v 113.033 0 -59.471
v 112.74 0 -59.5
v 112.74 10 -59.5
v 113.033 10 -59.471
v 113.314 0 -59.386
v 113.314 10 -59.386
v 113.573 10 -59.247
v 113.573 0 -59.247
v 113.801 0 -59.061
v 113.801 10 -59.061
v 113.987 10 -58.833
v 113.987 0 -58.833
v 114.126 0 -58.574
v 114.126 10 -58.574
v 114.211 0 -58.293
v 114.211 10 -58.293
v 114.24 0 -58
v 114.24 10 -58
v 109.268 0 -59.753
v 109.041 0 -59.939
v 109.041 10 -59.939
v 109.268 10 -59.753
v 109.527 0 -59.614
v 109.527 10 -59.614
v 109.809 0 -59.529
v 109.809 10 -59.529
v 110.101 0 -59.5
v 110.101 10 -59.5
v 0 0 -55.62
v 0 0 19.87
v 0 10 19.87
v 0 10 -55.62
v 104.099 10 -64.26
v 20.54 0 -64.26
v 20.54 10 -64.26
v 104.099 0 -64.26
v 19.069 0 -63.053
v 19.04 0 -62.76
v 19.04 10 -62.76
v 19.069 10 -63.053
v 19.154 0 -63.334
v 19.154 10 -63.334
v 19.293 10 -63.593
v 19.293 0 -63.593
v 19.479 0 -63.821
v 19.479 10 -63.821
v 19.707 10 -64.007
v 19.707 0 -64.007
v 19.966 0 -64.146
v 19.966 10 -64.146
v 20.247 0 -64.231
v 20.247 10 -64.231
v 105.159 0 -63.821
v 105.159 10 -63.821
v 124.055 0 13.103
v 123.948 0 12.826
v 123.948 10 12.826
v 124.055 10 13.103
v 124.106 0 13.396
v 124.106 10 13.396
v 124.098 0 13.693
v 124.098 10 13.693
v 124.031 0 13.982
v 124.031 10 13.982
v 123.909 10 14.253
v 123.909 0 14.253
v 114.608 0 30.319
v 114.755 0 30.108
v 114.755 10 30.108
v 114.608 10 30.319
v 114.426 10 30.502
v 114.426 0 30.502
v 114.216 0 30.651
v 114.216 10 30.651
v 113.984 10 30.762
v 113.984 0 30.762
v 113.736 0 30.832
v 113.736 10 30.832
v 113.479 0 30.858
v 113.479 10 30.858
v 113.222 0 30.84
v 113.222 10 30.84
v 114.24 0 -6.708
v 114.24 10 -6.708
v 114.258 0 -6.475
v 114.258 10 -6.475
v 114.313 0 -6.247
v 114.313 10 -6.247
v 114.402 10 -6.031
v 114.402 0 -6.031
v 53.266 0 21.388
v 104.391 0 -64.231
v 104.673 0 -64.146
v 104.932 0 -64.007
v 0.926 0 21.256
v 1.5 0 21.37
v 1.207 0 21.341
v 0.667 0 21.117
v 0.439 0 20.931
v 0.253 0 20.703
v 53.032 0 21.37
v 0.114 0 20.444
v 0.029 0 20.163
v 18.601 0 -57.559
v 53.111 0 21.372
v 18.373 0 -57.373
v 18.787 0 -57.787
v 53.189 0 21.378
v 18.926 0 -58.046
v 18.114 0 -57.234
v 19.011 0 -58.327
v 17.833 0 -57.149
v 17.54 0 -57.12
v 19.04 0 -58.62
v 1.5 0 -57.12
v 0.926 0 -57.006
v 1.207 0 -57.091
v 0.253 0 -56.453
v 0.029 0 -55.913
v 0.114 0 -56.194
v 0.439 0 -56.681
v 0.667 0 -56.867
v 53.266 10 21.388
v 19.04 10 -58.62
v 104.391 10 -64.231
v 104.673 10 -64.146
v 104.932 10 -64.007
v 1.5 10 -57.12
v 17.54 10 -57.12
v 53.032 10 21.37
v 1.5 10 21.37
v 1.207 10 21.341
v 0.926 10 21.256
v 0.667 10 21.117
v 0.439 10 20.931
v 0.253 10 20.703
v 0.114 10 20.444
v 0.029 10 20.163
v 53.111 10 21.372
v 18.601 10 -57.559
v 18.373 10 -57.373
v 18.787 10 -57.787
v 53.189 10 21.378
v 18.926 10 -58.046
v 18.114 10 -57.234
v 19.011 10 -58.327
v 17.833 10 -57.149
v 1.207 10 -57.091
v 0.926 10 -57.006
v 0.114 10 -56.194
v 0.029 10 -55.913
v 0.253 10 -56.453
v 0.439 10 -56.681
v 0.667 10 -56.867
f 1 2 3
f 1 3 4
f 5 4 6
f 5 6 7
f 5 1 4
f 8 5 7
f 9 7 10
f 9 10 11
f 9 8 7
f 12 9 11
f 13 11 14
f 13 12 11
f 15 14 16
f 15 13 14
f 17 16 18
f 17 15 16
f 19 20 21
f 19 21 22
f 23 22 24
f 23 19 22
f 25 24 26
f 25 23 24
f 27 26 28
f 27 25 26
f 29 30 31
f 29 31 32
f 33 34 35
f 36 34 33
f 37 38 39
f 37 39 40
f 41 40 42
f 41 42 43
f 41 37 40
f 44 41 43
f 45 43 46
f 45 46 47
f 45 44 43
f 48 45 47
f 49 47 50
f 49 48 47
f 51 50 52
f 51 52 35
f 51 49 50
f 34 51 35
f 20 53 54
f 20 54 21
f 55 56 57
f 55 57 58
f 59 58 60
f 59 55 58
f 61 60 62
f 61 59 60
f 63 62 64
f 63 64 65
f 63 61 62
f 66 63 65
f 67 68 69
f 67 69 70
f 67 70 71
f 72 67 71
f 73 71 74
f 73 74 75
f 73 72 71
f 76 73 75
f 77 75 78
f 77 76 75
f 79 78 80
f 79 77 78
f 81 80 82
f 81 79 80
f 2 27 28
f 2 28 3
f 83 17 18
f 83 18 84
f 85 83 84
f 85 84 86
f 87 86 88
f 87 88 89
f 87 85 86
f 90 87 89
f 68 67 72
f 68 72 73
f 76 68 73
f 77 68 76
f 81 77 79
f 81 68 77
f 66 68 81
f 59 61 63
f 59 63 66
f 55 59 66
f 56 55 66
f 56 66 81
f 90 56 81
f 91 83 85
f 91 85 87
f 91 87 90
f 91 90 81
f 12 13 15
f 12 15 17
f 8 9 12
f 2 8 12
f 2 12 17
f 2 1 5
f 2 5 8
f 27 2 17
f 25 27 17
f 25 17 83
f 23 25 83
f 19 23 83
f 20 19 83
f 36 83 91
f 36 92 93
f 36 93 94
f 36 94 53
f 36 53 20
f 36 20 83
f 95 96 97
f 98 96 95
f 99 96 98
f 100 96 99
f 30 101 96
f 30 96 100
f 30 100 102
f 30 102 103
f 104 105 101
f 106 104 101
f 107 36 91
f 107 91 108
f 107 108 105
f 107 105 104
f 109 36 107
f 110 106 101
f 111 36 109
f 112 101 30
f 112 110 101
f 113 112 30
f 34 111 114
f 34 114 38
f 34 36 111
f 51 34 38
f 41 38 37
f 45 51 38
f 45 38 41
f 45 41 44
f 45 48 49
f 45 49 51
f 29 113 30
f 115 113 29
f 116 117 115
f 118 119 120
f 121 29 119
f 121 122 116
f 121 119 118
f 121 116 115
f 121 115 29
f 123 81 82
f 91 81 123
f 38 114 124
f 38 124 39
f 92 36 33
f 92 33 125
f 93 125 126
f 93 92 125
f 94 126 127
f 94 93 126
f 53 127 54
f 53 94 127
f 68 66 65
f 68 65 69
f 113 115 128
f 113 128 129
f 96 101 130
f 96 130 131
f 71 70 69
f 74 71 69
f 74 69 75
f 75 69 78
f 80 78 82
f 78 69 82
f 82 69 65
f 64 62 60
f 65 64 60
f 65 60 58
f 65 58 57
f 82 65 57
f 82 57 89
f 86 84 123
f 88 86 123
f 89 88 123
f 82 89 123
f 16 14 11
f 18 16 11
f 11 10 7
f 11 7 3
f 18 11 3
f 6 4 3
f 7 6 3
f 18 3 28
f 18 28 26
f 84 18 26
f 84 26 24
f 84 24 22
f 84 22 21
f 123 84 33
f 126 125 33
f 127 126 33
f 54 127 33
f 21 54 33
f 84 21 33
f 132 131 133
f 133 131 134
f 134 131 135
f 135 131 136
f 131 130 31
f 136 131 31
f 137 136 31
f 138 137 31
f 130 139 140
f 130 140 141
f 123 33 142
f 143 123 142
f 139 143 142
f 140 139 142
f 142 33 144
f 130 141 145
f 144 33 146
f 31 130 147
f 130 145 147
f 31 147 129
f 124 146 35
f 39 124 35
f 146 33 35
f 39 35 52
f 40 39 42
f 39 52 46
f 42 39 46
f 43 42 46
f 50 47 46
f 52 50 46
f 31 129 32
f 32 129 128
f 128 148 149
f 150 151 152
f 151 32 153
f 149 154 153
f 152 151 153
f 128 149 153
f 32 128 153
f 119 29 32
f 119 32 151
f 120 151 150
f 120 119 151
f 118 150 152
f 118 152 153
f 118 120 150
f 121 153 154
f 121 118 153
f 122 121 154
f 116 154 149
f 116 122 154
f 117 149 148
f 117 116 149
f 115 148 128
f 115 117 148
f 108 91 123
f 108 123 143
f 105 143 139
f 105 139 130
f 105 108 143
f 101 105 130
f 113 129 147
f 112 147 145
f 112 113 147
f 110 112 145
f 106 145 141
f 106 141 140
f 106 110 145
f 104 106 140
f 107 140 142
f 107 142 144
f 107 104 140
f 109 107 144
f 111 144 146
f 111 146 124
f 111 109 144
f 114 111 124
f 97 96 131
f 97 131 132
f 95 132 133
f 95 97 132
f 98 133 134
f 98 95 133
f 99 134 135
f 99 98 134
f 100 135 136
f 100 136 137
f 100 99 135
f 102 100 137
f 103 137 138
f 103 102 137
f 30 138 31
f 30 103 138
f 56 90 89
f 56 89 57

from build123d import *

# Parameters (mm, degrees)
AUFSATZ_LINEAR_AUSTRAGEN1_DEPTH = 10


with BuildPart() as part:
    # Skizze2 → Aufsatz-Linear austragen1 (new body)
    with BuildSketch(Plane(origin=(0, 0, 0), x_dir=(1, 0, 0), z_dir=(0, 1, 0))):
        with BuildLine():
            Line((0, 0), (0, 55.62))
            ThreePointArc((0, 55.62), (0.439339828, 56.680660172), (1.5, 57.12))
            Line((1.5, 57.12), (17.54, 57.12))
            ThreePointArc((17.54, 57.12), (18.600660172, 57.559339828), (19.04, 58.62))
            Line((19.04, 58.62), (19.04, 62.76))
            ThreePointArc((19.04, 62.76), (19.479339828, 63.820660172), (20.54, 64.26))
            Line((20.54, 64.26), (104.098679656, 64.26))
            ThreePointArc((104.098679656, 64.26), (104.672704805, 64.145819299), (105.159339828, 63.820660172))
            Line((105.159339828, 63.820660172), (109.040660172, 59.939339828))
            ThreePointArc((109.040660172, 59.939339828), (109.527295195, 59.614180701), (110.101320344, 59.5))
            Line((110.101320344, 59.5), (112.74, 59.5))
            ThreePointArc((112.74, 59.5), (113.800660172, 59.060660172), (114.24, 58))
            Line((114.24, 58), (114.24, 6.708065653))
            ThreePointArc((114.24, 6.708065653), (114.280993169, 6.359785497), (114.401732089, 6.030541484))
            Line((114.401732089, 6.030541484), (123.948031101, -12.825620738))
            ThreePointArc((123.948031101, -12.825620738), (124.109197107, -13.544350864), (123.908801296, -14.253144906))
            Line((123.908801296, -14.253144906), (114.755057795, -30.10789373))
            ThreePointArc((114.755057795, -30.10789373), (114.102280417, -30.71153588), (113.222449486, -30.839597128))
            Line((113.222449486, -30.839597128), (53.266068474, -21.388296602))
            ThreePointArc((53.266068474, -21.388296602), (53.149641138, -21.374581146), (53.032498271, -21.37))
            Line((53.032498271, -21.37), (1.5, -21.37))
            ThreePointArc((1.5, -21.37), (0.439339828, -20.930660172), (0, -19.87))
            Line((0, -19.87), (0, 0))
        make_face()
    extrude(amount=AUFSATZ_LINEAR_AUSTRAGEN1_DEPTH)


solid = part.part
